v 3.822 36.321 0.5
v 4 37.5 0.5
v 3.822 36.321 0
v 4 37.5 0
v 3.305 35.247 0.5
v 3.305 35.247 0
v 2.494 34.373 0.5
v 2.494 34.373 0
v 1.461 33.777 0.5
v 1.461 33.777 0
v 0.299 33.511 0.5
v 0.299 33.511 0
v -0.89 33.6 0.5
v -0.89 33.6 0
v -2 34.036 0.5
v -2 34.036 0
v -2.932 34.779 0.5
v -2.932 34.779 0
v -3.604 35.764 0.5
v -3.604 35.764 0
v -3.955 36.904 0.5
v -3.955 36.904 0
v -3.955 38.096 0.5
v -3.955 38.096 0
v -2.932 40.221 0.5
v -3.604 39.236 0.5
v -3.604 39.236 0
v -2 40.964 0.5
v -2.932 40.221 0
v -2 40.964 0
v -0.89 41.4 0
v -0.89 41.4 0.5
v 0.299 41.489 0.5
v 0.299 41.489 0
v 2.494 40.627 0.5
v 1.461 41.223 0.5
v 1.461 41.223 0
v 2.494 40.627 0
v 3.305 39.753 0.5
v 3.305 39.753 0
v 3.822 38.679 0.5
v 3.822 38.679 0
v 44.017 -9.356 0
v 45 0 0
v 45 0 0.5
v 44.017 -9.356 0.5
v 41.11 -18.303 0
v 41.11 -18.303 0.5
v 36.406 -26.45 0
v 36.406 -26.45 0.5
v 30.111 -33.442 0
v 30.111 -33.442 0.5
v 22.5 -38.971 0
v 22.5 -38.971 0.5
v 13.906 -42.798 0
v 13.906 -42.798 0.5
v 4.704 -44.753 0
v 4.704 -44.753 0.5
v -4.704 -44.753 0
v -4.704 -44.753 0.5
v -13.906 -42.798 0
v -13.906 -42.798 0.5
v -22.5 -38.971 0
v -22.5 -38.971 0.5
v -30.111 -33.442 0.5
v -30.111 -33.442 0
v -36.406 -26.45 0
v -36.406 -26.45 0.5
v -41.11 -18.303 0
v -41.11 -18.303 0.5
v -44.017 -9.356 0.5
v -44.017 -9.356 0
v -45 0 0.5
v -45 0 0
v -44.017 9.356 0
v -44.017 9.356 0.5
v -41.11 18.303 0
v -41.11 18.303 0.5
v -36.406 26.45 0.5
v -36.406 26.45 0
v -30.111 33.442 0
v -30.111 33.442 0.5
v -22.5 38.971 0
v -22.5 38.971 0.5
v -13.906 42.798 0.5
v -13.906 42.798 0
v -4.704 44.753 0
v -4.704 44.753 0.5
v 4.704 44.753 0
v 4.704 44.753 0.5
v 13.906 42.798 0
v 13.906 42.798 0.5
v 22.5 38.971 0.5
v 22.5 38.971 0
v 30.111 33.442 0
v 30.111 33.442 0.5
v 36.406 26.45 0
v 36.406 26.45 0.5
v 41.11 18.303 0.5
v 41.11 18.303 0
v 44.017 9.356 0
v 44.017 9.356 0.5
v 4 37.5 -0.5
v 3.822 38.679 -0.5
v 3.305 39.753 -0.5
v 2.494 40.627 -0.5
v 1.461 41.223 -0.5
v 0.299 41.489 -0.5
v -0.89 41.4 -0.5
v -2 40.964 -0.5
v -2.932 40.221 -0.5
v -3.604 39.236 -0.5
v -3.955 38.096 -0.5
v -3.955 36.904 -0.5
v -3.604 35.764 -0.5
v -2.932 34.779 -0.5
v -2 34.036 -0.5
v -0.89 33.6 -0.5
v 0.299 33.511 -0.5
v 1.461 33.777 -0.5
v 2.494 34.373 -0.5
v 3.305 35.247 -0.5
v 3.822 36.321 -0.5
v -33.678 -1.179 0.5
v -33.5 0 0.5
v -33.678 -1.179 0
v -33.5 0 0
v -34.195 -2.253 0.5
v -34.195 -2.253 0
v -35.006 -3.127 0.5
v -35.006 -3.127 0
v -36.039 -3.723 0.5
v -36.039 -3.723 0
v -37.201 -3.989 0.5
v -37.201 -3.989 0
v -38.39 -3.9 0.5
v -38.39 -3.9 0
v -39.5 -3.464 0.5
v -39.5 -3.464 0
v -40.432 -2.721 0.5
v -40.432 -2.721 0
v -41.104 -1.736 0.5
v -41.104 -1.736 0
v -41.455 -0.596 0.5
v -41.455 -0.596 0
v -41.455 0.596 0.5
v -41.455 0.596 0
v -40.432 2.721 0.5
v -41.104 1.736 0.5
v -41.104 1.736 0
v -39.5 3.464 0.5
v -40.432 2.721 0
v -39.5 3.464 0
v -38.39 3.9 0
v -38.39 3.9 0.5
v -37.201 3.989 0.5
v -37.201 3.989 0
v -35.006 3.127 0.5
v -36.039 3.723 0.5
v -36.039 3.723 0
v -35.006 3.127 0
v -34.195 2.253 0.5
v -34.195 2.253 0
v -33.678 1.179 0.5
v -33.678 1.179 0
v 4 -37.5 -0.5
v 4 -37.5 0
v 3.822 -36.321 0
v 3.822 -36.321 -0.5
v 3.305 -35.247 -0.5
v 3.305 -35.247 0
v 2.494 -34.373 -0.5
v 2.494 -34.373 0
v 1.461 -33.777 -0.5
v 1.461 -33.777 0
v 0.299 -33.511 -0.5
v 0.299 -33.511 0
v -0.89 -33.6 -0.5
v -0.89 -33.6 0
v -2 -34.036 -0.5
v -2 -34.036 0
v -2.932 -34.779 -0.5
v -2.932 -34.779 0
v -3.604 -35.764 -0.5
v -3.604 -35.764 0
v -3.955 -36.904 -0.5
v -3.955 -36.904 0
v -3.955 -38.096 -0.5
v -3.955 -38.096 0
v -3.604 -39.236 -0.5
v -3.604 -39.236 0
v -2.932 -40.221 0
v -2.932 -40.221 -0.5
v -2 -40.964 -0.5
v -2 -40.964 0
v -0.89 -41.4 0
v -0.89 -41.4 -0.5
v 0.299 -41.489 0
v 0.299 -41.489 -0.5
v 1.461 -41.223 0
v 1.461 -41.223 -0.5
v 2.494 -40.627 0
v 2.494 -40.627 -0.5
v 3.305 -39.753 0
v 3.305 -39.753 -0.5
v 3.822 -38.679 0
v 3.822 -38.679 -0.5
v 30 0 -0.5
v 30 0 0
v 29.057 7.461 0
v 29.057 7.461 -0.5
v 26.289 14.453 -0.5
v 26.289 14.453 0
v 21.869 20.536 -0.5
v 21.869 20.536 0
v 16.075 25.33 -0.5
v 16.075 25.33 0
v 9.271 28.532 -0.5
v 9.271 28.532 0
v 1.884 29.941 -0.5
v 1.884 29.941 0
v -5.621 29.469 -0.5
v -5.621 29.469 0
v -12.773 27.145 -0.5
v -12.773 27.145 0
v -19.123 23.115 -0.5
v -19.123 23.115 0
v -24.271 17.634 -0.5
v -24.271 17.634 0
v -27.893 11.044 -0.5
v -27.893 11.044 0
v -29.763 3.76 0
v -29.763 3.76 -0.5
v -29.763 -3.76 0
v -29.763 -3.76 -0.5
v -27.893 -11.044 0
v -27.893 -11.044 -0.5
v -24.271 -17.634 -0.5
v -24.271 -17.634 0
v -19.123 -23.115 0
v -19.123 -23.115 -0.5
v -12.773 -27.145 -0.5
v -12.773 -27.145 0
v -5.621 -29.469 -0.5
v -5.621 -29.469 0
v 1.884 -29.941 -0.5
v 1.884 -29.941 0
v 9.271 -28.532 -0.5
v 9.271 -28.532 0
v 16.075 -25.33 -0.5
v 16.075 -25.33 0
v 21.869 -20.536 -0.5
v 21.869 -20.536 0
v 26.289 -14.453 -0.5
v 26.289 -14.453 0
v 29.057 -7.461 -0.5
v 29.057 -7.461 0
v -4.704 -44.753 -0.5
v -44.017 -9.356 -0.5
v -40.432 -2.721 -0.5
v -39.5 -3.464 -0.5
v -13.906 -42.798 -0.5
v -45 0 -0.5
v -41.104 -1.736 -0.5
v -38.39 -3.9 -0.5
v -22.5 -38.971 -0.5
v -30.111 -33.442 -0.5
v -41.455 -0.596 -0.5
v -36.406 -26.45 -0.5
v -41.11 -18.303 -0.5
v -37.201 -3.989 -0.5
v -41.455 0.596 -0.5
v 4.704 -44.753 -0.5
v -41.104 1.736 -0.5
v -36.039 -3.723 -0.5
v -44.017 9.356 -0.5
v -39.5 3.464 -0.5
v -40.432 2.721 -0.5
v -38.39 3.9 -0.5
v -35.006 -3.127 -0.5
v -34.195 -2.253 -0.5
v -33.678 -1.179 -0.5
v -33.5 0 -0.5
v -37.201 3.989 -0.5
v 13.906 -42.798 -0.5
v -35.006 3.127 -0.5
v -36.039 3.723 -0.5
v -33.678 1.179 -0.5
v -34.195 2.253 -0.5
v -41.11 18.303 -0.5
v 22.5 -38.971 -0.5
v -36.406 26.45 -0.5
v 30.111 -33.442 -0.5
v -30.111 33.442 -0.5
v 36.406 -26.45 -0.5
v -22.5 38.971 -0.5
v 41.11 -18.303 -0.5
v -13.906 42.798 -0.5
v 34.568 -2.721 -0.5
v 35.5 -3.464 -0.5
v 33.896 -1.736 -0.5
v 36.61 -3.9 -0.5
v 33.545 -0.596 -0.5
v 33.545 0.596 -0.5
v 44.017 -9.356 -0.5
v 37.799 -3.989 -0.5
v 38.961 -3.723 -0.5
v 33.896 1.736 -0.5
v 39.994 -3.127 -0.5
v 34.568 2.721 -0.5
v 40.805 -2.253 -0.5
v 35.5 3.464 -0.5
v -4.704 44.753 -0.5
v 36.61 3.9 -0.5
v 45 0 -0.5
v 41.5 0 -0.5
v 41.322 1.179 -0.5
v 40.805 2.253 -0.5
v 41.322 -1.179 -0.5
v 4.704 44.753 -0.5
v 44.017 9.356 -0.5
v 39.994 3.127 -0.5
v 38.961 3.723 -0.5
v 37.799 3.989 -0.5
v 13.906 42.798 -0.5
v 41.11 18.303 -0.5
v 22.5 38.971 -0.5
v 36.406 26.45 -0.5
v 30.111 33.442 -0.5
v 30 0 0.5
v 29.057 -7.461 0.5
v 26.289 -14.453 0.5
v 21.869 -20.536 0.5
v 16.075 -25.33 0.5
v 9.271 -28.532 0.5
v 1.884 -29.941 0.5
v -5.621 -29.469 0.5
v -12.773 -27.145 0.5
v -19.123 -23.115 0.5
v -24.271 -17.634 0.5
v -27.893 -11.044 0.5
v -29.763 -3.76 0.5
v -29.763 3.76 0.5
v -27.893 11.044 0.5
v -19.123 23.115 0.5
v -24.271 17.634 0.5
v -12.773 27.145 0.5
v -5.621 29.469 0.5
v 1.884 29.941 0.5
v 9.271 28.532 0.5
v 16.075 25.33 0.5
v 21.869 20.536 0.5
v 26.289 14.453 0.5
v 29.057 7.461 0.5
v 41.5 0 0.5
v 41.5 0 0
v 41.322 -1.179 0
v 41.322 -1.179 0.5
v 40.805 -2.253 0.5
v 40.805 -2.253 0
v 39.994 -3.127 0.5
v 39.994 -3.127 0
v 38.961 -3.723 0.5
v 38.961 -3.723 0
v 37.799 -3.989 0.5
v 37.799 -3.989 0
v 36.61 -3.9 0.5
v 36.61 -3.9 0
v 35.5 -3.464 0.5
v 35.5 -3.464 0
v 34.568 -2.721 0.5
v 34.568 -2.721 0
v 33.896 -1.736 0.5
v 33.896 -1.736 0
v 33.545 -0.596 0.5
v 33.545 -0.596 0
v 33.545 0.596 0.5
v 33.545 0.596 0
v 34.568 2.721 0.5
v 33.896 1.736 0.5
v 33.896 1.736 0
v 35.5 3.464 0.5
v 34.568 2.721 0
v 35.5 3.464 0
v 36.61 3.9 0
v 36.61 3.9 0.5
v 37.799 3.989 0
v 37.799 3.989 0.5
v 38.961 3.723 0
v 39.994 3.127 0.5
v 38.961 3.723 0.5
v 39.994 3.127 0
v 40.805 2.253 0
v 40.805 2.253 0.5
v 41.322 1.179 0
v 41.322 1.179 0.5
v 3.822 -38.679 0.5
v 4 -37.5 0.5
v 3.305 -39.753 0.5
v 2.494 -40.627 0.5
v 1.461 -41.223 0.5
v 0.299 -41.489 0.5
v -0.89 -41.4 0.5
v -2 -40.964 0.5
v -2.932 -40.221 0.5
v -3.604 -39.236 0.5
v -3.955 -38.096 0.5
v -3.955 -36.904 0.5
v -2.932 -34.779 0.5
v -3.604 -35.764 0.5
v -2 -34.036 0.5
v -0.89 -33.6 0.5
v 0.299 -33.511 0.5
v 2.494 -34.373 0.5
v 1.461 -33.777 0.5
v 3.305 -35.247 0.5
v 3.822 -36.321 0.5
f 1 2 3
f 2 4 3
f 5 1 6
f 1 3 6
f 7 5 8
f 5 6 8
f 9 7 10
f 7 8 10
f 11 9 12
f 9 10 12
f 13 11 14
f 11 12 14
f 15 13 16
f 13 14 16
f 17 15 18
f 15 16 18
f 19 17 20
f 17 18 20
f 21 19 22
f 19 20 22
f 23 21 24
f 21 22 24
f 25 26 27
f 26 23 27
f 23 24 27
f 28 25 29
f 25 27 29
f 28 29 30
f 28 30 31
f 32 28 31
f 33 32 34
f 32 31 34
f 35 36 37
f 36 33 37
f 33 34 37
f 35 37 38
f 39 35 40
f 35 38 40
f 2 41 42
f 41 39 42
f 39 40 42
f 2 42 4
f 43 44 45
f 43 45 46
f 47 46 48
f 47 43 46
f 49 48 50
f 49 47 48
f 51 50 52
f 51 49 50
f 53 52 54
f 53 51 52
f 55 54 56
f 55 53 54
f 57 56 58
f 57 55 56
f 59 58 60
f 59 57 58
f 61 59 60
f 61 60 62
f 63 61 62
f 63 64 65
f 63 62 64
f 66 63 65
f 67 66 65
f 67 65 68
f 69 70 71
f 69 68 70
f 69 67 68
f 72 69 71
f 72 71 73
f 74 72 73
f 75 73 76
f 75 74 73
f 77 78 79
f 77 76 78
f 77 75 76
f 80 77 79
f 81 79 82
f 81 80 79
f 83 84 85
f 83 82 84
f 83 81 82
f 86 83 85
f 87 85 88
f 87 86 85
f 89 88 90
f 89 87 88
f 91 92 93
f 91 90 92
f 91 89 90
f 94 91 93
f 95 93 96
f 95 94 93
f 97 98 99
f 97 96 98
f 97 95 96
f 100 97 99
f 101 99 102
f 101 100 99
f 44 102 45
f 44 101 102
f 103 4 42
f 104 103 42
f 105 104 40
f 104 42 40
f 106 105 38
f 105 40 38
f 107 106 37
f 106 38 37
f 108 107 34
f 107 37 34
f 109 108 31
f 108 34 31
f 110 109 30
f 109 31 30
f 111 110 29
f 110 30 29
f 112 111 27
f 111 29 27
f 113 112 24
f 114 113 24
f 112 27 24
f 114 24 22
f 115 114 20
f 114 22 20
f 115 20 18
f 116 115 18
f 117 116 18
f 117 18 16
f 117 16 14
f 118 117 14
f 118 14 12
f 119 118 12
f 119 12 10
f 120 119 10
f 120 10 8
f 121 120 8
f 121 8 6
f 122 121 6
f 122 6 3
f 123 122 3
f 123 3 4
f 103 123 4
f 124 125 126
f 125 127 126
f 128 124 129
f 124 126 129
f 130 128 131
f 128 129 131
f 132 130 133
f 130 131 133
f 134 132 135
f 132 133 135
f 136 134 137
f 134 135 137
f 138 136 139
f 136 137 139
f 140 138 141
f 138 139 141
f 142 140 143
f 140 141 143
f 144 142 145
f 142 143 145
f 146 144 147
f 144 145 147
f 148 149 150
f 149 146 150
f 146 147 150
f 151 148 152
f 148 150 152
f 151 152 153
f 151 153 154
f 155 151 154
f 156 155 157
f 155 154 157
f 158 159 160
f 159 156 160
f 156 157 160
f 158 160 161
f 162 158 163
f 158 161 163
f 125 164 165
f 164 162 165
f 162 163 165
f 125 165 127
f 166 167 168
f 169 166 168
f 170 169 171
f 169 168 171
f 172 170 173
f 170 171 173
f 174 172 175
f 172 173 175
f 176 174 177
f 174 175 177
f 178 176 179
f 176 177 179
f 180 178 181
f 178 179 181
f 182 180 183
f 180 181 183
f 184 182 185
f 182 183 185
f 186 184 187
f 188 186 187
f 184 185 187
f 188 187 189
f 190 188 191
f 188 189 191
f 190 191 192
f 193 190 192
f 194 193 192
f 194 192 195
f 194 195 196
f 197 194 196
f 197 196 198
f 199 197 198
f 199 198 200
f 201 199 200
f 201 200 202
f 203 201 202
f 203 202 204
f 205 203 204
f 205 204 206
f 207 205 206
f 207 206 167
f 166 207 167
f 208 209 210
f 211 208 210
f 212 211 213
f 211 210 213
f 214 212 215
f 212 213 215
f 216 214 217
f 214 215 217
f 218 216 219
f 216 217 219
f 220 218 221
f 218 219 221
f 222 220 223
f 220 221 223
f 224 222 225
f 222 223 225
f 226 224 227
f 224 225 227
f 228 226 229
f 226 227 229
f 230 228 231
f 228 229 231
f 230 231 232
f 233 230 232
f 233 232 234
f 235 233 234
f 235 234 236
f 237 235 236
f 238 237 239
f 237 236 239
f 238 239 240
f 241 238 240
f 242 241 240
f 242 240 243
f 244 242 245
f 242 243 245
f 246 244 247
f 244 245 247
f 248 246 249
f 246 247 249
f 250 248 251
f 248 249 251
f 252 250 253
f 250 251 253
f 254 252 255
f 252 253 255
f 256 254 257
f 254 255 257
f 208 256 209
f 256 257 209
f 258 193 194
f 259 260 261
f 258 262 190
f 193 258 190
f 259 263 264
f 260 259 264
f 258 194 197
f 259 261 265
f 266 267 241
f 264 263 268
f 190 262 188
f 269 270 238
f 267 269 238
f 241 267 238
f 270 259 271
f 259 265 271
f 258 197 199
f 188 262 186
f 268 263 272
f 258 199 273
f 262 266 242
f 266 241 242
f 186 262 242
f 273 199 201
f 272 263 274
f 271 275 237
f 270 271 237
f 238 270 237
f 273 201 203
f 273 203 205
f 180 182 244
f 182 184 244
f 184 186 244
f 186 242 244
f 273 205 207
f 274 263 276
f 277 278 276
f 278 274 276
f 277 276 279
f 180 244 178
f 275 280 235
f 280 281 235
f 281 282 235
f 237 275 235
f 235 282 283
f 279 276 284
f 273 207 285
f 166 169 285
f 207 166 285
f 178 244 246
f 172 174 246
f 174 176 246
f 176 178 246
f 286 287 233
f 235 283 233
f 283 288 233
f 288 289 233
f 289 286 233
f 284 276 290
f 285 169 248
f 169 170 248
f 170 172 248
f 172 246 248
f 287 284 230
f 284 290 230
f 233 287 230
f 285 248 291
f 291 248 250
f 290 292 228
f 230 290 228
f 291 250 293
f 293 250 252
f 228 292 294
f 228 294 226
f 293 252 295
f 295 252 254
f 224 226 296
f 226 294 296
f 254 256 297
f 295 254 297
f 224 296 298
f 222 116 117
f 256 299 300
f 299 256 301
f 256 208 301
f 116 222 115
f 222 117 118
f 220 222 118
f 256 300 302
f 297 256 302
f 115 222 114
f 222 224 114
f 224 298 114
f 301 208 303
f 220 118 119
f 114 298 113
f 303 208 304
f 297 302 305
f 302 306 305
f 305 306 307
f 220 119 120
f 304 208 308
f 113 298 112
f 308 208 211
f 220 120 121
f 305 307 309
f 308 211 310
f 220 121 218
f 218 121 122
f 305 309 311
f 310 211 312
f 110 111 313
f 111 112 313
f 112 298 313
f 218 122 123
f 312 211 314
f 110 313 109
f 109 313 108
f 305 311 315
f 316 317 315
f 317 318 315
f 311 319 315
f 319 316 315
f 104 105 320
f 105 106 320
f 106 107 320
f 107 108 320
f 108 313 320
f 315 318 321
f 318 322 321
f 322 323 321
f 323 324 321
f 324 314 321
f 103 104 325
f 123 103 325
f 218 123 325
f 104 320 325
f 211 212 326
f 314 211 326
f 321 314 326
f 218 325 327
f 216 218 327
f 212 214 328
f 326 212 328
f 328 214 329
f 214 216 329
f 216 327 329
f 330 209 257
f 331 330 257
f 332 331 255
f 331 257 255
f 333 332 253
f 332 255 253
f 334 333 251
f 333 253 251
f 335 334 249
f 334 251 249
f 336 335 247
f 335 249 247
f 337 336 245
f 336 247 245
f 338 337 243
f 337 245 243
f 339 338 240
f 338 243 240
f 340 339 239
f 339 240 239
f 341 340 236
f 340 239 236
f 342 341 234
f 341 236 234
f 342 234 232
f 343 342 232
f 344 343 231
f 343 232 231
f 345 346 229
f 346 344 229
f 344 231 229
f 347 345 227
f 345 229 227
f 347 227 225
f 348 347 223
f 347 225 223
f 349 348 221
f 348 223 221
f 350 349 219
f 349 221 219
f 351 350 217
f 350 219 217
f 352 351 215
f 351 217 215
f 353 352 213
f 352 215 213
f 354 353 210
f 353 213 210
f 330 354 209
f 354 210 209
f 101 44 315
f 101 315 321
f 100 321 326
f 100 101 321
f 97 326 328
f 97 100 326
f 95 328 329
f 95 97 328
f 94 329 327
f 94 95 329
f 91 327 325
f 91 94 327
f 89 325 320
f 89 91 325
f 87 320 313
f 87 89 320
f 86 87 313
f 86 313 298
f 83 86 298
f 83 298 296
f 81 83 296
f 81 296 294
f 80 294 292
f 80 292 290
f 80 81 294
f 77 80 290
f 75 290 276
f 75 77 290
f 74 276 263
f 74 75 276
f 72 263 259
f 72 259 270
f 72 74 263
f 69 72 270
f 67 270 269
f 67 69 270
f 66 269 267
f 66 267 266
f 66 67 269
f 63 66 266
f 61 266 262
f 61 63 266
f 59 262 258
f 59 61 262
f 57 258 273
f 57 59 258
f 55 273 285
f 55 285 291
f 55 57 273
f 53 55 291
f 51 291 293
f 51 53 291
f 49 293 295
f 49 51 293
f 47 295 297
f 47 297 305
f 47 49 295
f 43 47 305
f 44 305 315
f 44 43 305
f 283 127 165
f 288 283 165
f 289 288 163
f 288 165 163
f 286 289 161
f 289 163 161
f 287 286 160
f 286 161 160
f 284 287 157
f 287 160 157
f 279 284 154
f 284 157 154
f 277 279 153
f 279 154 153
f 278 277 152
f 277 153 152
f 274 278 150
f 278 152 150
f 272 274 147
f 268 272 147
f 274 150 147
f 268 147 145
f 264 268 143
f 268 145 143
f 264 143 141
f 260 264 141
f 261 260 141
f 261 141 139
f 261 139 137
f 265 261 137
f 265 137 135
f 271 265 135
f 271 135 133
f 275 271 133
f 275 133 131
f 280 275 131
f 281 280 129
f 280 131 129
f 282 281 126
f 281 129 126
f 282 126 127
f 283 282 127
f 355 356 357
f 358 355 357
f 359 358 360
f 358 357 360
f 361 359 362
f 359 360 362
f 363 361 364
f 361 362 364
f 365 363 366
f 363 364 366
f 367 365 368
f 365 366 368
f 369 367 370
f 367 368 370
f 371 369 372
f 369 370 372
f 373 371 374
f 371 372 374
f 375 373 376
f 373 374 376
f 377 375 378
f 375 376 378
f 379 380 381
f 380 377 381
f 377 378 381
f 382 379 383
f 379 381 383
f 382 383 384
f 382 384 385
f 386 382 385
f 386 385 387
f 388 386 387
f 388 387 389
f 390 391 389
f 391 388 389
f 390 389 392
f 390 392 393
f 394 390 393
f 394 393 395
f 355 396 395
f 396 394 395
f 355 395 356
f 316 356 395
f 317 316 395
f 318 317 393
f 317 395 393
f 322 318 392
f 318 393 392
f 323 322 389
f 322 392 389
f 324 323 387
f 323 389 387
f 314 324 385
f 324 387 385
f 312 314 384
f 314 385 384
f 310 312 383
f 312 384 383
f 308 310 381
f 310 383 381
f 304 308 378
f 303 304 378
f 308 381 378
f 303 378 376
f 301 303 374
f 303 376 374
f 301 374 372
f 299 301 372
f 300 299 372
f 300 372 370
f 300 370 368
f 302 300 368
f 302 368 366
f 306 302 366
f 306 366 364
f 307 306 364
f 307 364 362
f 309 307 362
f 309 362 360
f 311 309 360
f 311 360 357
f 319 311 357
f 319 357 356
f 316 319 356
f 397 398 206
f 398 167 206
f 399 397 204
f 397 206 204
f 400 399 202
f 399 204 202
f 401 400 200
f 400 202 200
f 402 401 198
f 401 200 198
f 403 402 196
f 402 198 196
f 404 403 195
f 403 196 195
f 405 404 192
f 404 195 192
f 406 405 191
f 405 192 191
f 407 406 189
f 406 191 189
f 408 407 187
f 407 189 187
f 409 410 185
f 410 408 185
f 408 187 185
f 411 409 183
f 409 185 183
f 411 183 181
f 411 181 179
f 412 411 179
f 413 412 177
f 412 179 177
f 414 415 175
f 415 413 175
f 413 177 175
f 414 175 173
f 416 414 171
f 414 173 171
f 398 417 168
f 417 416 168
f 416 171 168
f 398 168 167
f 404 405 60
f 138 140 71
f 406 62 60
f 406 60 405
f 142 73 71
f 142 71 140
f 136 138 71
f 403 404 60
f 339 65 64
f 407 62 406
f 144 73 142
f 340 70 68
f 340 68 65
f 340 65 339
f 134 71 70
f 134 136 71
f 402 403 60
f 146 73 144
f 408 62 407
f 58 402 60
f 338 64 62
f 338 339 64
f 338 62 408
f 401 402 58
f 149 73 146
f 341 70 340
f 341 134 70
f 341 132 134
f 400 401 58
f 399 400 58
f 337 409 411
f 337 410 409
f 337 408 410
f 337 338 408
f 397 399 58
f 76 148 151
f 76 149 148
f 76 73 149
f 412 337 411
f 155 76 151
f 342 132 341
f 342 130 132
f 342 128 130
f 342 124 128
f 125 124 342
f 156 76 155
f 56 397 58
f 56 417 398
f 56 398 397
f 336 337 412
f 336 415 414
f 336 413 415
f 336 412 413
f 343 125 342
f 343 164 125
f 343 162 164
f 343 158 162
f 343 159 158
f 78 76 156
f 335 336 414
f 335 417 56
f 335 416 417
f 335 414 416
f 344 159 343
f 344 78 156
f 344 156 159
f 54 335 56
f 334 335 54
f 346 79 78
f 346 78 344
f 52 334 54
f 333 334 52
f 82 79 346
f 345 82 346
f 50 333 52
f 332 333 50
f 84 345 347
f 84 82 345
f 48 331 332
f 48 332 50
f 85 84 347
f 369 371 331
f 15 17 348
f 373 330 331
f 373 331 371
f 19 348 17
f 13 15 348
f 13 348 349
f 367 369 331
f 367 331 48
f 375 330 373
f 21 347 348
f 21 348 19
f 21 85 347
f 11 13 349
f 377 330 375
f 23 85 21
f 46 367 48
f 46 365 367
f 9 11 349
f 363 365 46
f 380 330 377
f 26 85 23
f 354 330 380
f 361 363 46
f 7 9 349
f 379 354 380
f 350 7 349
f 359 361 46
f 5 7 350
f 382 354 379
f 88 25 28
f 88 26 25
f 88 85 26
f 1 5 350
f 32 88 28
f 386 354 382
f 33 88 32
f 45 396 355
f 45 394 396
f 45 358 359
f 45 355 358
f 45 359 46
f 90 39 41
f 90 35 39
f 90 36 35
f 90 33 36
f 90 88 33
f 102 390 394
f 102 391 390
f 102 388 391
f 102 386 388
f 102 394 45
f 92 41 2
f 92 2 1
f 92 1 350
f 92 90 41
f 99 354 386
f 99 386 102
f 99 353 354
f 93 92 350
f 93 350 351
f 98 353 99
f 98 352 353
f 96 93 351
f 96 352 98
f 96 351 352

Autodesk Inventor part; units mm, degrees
ref_plane "YZ Plane" through (0, 0, 0) normal (1, 0, 0) x (0, 1, 0)
ref_plane "XZ Plane" through (0, 0, 0) normal (0, 1, 0) x (-1, 0, 0)
ref_plane "XY Plane" through (0, 0, 0) normal (0, 0, 1) x (1, 0, 0)
sketch "Sketch1" plane through (0, 0, 0) normal (0, 0, 1) x (1, 0, 0)
  circle A0 centre (0, 0) radius 45
  circle A1 centre (0, 0) radius 30
  circle A2 centre (0, 37.5) radius 4
  circle A3 centre (-37.5, 0) radius 4
  circle A4 centre (0, -37.5) radius 4
  circle A5 centre (37.5, 0) radius 4
  dimension "d0" = 90
  dimension "d1" = 60
  dimension "d2" = 8
  dimension "d3" = 37.5
  dimension "d6" = 360
  dimension "d8" = 75
  dimension "d9" = 37.5
  dimension "d10" = 37.5
  dimension "d11" = 75
extrude "Extrusion1" add sketch "Sketch1" along normal mid plane 1
